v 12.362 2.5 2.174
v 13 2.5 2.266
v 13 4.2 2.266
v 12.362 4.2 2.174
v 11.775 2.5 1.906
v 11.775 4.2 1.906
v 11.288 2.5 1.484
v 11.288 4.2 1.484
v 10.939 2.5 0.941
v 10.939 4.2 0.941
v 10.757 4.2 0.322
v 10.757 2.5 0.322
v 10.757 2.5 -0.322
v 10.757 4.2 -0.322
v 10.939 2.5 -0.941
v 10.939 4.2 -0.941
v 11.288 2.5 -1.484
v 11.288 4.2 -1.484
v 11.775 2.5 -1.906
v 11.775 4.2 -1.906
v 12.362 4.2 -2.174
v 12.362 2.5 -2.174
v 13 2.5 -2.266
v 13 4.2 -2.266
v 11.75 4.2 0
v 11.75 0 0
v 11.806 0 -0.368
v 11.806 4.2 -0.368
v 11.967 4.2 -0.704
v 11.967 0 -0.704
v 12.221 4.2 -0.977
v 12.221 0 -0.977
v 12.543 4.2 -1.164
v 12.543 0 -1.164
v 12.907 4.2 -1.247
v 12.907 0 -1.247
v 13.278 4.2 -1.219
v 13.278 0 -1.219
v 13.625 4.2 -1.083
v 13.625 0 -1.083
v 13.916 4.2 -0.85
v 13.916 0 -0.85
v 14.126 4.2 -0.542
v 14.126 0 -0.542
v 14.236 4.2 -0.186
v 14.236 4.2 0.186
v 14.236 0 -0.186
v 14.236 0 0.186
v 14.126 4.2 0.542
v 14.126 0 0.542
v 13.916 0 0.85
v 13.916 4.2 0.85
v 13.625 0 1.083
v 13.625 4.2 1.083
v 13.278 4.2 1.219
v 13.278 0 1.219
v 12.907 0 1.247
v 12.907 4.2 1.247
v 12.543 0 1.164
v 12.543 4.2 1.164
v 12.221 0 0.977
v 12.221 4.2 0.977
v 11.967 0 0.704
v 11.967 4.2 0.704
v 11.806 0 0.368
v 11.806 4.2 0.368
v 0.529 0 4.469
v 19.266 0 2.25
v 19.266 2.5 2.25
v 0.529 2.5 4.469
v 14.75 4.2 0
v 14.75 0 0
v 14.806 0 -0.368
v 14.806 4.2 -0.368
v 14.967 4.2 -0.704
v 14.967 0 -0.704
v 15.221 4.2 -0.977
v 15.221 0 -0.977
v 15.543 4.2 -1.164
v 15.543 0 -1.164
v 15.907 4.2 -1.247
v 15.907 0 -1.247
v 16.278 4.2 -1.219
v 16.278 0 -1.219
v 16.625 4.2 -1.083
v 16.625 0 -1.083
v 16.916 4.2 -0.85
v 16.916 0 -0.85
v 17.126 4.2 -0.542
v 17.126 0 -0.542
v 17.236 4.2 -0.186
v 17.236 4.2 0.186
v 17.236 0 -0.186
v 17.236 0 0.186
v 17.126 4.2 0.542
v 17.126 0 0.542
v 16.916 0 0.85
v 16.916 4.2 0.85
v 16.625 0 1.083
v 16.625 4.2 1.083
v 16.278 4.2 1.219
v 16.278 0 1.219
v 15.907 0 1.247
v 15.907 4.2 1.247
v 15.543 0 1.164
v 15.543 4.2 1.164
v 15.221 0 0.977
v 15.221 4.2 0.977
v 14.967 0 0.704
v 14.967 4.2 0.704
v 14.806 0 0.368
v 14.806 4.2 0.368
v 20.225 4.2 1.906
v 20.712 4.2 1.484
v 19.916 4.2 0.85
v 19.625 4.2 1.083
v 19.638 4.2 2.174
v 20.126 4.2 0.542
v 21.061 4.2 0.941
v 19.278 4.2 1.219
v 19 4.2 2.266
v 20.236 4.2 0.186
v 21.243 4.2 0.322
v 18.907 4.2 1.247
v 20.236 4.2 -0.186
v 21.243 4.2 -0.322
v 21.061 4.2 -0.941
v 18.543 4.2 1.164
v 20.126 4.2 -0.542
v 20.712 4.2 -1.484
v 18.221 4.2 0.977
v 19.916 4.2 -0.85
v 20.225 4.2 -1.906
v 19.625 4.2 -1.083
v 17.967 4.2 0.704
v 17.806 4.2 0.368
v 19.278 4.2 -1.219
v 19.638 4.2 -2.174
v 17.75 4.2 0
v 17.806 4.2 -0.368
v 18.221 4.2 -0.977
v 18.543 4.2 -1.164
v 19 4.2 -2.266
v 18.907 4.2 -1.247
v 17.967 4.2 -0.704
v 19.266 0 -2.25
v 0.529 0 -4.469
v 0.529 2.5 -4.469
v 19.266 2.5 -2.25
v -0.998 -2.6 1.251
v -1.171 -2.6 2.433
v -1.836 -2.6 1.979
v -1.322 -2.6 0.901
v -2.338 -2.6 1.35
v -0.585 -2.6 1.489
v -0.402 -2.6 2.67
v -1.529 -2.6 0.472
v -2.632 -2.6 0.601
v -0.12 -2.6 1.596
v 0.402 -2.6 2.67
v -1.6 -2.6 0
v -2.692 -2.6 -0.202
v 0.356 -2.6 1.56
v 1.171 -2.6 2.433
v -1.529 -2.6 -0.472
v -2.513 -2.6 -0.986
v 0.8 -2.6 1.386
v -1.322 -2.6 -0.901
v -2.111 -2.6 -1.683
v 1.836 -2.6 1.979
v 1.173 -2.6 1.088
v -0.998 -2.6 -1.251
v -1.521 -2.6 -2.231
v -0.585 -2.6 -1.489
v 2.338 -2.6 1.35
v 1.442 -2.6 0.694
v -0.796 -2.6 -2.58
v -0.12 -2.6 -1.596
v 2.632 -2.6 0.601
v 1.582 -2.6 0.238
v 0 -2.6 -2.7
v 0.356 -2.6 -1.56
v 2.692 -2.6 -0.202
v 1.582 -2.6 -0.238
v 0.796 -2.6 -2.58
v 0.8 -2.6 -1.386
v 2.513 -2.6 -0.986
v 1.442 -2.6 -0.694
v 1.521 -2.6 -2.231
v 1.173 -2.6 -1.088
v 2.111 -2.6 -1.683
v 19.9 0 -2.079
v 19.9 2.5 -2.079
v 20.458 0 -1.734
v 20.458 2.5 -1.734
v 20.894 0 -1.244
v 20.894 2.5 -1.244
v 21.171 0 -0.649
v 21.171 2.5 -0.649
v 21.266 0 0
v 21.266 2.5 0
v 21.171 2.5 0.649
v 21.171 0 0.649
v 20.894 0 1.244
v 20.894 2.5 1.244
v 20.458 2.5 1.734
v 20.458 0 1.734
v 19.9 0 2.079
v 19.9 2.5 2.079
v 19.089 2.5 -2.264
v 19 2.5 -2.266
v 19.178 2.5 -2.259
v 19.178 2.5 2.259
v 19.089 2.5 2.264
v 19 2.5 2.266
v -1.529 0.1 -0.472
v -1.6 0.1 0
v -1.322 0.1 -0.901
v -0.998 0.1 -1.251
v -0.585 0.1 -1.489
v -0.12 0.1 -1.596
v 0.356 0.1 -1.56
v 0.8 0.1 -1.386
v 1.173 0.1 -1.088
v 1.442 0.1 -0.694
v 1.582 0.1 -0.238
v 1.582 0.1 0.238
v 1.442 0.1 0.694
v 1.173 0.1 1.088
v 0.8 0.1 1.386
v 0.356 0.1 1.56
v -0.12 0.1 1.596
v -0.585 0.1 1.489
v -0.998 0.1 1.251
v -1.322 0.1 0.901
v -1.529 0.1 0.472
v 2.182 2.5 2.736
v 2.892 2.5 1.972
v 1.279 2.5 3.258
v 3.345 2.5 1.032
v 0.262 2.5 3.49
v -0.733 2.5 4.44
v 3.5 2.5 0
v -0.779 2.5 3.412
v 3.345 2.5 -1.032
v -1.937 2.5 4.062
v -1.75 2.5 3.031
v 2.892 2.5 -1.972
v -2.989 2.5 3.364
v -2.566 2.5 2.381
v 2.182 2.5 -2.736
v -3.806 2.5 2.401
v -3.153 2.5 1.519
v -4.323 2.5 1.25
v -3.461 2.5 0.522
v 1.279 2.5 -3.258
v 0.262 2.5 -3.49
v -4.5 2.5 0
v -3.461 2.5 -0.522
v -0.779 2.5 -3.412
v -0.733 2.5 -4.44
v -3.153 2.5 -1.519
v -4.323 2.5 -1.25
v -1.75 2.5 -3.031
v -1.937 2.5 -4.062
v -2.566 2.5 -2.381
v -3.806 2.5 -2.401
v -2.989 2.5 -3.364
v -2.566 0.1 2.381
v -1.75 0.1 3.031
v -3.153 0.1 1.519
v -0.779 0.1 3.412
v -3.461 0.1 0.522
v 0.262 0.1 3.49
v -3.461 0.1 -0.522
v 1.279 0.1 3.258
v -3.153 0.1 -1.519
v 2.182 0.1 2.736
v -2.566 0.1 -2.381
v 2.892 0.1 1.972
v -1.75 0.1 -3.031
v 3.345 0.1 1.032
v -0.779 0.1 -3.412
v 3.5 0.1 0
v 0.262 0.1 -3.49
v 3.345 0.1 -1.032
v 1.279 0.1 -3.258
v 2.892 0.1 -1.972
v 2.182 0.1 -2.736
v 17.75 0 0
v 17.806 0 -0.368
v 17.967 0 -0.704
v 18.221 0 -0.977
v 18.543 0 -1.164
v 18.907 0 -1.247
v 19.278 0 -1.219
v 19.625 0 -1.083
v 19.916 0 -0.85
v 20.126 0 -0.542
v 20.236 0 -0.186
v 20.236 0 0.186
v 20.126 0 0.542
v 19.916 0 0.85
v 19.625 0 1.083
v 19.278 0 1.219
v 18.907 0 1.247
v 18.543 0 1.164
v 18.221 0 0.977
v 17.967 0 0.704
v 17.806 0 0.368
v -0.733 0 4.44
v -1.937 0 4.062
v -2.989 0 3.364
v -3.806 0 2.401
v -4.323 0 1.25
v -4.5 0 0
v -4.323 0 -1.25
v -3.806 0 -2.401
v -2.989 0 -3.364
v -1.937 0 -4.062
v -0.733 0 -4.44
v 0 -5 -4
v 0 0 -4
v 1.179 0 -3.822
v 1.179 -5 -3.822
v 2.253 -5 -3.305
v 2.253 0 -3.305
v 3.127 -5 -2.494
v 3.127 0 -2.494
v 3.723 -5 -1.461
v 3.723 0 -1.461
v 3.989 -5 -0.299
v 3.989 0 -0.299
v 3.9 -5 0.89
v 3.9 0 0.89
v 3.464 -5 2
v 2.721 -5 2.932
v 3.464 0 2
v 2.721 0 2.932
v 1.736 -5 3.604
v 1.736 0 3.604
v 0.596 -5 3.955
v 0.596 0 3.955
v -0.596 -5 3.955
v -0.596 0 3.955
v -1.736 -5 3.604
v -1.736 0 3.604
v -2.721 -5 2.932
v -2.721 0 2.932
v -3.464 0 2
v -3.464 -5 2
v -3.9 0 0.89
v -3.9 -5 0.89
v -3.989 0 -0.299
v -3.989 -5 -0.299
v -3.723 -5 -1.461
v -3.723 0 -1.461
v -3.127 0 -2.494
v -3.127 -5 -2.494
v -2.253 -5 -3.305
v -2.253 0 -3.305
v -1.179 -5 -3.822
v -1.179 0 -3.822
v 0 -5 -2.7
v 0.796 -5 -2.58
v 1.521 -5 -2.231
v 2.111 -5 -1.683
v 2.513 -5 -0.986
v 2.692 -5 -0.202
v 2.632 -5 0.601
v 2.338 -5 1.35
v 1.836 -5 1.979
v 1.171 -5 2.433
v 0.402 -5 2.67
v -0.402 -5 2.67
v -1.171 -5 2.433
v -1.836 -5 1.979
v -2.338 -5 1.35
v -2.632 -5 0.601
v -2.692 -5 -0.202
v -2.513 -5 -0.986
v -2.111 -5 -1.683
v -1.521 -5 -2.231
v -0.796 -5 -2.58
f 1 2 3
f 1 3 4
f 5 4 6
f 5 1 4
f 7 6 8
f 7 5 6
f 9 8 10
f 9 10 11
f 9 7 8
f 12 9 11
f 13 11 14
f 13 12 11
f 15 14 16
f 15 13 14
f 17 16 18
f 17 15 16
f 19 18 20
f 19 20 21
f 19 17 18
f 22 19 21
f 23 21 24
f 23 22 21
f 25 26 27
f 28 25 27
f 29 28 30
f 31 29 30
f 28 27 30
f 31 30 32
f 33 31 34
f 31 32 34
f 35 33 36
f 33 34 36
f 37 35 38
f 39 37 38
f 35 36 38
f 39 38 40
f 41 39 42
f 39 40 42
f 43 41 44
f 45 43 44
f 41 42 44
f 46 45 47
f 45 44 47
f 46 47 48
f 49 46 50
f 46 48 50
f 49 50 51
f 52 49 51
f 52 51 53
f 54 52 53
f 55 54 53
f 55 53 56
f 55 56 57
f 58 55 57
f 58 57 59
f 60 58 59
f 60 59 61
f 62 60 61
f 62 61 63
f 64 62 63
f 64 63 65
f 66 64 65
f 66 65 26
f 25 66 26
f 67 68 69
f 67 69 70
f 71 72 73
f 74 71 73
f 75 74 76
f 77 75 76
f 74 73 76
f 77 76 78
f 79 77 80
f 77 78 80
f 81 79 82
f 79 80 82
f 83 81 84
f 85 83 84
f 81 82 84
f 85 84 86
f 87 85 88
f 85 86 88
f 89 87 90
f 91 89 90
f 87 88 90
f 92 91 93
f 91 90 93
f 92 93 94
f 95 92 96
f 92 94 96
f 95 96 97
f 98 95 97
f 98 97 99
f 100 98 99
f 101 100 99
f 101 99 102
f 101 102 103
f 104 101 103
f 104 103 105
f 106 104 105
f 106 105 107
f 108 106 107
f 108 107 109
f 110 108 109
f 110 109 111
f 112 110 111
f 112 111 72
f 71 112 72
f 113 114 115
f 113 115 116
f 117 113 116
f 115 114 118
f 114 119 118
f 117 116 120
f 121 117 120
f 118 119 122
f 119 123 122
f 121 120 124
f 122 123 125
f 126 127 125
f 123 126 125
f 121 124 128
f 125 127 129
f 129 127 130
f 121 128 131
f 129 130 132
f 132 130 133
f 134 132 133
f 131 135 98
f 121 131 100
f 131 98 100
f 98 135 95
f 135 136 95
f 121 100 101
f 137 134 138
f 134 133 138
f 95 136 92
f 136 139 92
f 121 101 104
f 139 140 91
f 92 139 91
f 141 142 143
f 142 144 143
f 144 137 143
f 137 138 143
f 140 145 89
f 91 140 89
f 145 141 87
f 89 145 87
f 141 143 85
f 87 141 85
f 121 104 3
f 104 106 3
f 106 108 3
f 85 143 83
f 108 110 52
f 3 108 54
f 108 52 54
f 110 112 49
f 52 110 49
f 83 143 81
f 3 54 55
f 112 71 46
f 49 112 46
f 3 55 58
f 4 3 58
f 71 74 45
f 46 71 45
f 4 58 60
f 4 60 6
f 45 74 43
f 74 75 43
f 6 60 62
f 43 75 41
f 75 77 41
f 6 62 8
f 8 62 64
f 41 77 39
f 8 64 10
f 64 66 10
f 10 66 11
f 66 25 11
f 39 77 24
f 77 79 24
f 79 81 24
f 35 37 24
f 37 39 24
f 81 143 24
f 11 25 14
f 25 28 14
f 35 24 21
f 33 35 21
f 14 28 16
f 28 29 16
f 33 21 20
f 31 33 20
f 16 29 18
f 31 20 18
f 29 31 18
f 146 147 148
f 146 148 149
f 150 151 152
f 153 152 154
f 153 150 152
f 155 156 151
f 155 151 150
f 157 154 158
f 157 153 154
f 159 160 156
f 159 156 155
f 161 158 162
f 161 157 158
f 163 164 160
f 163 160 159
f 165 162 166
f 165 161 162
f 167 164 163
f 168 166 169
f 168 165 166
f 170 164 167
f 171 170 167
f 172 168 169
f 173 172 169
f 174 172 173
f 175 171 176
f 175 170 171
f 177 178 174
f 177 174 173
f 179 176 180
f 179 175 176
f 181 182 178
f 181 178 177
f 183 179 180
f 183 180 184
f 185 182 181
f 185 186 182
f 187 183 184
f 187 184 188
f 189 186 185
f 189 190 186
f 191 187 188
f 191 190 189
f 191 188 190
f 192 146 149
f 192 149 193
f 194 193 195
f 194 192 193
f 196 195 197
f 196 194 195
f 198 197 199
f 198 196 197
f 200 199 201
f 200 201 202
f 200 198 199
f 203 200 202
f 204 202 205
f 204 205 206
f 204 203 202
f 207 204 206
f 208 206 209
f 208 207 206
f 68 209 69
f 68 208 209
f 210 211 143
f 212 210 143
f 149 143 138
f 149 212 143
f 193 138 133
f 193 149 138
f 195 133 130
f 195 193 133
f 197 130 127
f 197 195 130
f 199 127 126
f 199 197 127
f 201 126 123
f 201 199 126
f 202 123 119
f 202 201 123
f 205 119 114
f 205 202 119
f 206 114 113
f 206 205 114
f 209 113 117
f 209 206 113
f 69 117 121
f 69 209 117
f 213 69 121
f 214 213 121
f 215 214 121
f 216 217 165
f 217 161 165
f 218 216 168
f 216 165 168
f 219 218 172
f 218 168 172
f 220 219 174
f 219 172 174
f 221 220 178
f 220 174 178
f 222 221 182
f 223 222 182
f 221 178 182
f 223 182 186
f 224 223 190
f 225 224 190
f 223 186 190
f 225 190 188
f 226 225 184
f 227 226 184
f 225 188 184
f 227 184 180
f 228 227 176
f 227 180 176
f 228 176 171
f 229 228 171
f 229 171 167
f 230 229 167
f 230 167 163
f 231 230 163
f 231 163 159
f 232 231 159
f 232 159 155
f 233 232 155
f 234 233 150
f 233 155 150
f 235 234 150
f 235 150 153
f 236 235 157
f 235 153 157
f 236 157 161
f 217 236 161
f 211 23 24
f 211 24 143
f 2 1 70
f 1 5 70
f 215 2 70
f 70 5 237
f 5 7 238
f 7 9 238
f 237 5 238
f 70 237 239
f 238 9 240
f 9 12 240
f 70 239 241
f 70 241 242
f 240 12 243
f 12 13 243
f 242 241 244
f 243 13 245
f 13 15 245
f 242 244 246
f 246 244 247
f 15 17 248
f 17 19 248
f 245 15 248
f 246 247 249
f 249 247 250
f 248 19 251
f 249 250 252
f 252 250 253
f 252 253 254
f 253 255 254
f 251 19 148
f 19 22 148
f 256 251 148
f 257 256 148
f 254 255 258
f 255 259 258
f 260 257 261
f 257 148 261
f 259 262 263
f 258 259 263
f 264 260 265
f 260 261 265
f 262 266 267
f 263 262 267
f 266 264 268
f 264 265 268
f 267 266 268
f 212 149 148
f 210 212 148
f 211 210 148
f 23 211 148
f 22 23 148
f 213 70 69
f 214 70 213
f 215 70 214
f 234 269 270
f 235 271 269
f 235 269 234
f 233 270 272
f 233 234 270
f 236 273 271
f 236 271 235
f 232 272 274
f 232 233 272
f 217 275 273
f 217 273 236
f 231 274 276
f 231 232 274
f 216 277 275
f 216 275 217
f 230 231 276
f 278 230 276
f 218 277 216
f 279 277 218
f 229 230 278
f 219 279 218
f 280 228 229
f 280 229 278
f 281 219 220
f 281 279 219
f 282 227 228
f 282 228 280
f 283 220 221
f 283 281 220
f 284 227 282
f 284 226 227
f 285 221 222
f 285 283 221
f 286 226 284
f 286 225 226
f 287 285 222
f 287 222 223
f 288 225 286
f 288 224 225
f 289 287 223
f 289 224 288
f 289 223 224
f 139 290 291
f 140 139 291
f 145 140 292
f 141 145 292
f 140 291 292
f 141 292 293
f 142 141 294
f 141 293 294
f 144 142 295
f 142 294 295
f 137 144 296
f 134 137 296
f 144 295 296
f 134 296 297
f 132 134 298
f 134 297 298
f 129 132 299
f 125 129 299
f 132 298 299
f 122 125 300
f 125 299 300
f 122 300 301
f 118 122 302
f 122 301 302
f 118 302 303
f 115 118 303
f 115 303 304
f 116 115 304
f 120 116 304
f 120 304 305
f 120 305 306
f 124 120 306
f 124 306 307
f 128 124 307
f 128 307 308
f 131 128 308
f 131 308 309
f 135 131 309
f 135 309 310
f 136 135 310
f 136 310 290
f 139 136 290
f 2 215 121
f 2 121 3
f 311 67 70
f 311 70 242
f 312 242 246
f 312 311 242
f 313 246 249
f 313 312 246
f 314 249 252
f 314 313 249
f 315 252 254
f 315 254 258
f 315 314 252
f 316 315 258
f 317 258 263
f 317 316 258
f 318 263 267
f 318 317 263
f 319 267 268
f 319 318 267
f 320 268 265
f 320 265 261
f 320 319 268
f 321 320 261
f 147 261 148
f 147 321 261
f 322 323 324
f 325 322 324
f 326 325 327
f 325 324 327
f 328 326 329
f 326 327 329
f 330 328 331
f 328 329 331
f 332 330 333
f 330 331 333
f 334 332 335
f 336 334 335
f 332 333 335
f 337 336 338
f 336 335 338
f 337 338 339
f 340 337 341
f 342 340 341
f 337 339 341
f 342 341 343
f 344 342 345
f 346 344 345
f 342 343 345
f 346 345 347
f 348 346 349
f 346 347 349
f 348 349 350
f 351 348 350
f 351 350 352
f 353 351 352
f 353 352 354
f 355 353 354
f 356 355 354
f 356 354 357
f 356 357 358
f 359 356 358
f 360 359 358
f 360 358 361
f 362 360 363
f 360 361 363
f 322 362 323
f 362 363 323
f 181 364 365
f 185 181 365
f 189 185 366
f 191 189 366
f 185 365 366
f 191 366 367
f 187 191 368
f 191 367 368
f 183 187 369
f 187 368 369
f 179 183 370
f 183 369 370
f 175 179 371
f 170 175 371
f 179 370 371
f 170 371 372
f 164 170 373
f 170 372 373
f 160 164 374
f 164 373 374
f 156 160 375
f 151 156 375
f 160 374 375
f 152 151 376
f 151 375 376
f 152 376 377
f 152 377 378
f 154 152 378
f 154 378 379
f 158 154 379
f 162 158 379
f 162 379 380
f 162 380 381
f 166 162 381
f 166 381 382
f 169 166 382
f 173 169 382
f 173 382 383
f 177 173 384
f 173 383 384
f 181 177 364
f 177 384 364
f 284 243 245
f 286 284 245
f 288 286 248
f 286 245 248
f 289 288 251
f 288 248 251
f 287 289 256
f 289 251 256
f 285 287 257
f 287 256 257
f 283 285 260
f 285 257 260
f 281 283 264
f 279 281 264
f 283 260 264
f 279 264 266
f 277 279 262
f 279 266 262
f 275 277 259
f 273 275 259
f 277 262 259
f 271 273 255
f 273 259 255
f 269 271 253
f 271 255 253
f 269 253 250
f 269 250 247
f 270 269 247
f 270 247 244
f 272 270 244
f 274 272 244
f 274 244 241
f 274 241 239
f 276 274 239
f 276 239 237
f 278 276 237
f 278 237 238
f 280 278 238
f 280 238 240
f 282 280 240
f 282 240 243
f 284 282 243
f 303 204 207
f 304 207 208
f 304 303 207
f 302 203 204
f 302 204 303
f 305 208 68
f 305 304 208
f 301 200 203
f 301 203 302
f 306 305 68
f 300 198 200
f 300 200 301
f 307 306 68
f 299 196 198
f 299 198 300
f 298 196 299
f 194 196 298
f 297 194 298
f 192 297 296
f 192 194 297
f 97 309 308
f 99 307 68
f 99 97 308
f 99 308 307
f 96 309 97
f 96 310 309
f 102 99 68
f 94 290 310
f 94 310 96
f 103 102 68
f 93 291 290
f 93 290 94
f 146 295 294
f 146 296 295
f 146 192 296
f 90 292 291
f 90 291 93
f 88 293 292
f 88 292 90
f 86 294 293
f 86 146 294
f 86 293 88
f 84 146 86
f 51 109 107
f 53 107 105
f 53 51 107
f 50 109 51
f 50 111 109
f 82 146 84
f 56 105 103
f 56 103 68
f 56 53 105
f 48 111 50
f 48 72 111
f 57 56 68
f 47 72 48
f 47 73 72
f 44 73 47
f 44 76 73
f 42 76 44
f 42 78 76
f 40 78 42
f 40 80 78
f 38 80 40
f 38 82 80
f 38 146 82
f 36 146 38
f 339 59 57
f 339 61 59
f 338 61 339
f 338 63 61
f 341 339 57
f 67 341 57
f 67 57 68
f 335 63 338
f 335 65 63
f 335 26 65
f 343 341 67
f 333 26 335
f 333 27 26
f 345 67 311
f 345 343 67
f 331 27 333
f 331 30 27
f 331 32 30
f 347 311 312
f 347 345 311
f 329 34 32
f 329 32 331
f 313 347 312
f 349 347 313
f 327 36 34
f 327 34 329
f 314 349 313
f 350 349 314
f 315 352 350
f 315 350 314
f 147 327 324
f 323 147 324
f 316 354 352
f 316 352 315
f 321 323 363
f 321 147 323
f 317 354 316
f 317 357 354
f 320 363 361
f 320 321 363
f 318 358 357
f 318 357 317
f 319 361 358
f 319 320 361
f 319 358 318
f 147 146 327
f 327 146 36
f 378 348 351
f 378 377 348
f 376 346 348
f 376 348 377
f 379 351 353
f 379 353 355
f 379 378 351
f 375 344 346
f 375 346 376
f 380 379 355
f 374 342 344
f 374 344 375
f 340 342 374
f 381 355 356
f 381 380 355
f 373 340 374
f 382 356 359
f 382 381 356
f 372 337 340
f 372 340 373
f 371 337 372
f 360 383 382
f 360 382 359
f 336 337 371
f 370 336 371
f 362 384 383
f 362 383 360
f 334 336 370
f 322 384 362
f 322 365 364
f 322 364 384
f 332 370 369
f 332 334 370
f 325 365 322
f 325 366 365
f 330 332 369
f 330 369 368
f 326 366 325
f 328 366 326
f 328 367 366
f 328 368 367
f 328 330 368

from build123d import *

# Parameters (mm, degrees)
BOSS_EXTRU_1_DEPTH                                 = 2.5
ESQUISSE2_R                                        = 4
BOSS_EXTRU_2_DEPTH                                 = 5
ESQUISSE3_R                                        = 2.7
ENL_V_MAT_EXTRU_1_DEPTH                            = 2.4
CHAMBRAGE_POUR_VIS_T_TE_RONDE_BOMB_E_M_D           = 3.2
CHAMBRAGE_POUR_VIS_T_TE_RONDE_BOMB_E_M_CBORE_D     = 7
CHAMBRAGE_POUR_VIS_T_TE_RONDE_BOMB_E_M_CBORE_DEPTH = 2.4
BOSS_EXTRU_3_DEPTH                                 = 1.7
DIAM_TRE_DU_PER_AGE_2_5_2_5_1_D                    = 2.5


with BuildPart() as part:
    # Esquisse1 → Boss.-Extru.1 (new body)
    with BuildSketch(Plane(origin=(0, 0, 0), x_dir=(1, 0, 0), z_dir=(0, 1, 0))):
        with BuildLine():
            Line((0.529171571, 4.468778071), (19.266434362, 2.25))
            ThreePointArc((19.266434362, 2.25), (21.265720033, 0), (19.266434362, -2.25))
            Line((19.266434362, -2.25), (0.529171571, -4.468778071))
            ThreePointArc((0.529171571, -4.468778071), (-4.5, 0), (0.529171571, 4.468778071))
        make_face()
    extrude(amount=BOSS_EXTRU_1_DEPTH)

    # Esquisse2 → Boss.-Extru.2 (add)
    with BuildSketch(Plane.XZ):
        Circle(ESQUISSE2_R)
    extrude(amount=BOSS_EXTRU_2_DEPTH)

    # Esquisse3 → Enlèv. mat.-Extru.1 (cut)
    with BuildSketch(Plane.XZ.offset(5)):
        Circle(ESQUISSE3_R)
    extrude(amount=-ENL_V_MAT_EXTRU_1_DEPTH, mode=Mode.SUBTRACT)

    # Chambrage pour vis à tête ronde bombée M31 (through all)
    with Locations(Plane(origin=(0, 2.5, 0), x_dir=(1, 0, 0), z_dir=(0, 1, 0))):
        with Locations((0, 0)):
            CounterBoreHole(CHAMBRAGE_POUR_VIS_T_TE_RONDE_BOMB_E_M_D / 2, CHAMBRAGE_POUR_VIS_T_TE_RONDE_BOMB_E_M_CBORE_D / 2, CHAMBRAGE_POUR_VIS_T_TE_RONDE_BOMB_E_M_CBORE_DEPTH)

    # Esquisse6 → Boss.-Extru.3 (add)
    with BuildSketch(Plane(origin=(0, 2.5, 0), x_dir=(1, 0, 0), z_dir=(0, 1, 0))):
        with BuildLine():
            Line((19, -2.265720033), (13, -2.265720033))
            ThreePointArc((13, -2.265720033), (10.734279967, 0), (13, 2.265720033))
            Line((13, 2.265720033), (19, 2.265720033))
            ThreePointArc((19, 2.265720033), (21.265720033, 0), (19, -2.265720033))
        make_face()
    extrude(amount=BOSS_EXTRU_3_DEPTH)

    # Diamètre du perçage Ø2.5 (2.5)1 (through all)
    with Locations(Plane(origin=(0, 4.2, 0), x_dir=(1, 0, 0), z_dir=(0, 1, 0))):
        with Locations((13, 0), (16, 0), (19, 0)):
            Hole(DIAM_TRE_DU_PER_AGE_2_5_2_5_1_D / 2)


solid = part.part
